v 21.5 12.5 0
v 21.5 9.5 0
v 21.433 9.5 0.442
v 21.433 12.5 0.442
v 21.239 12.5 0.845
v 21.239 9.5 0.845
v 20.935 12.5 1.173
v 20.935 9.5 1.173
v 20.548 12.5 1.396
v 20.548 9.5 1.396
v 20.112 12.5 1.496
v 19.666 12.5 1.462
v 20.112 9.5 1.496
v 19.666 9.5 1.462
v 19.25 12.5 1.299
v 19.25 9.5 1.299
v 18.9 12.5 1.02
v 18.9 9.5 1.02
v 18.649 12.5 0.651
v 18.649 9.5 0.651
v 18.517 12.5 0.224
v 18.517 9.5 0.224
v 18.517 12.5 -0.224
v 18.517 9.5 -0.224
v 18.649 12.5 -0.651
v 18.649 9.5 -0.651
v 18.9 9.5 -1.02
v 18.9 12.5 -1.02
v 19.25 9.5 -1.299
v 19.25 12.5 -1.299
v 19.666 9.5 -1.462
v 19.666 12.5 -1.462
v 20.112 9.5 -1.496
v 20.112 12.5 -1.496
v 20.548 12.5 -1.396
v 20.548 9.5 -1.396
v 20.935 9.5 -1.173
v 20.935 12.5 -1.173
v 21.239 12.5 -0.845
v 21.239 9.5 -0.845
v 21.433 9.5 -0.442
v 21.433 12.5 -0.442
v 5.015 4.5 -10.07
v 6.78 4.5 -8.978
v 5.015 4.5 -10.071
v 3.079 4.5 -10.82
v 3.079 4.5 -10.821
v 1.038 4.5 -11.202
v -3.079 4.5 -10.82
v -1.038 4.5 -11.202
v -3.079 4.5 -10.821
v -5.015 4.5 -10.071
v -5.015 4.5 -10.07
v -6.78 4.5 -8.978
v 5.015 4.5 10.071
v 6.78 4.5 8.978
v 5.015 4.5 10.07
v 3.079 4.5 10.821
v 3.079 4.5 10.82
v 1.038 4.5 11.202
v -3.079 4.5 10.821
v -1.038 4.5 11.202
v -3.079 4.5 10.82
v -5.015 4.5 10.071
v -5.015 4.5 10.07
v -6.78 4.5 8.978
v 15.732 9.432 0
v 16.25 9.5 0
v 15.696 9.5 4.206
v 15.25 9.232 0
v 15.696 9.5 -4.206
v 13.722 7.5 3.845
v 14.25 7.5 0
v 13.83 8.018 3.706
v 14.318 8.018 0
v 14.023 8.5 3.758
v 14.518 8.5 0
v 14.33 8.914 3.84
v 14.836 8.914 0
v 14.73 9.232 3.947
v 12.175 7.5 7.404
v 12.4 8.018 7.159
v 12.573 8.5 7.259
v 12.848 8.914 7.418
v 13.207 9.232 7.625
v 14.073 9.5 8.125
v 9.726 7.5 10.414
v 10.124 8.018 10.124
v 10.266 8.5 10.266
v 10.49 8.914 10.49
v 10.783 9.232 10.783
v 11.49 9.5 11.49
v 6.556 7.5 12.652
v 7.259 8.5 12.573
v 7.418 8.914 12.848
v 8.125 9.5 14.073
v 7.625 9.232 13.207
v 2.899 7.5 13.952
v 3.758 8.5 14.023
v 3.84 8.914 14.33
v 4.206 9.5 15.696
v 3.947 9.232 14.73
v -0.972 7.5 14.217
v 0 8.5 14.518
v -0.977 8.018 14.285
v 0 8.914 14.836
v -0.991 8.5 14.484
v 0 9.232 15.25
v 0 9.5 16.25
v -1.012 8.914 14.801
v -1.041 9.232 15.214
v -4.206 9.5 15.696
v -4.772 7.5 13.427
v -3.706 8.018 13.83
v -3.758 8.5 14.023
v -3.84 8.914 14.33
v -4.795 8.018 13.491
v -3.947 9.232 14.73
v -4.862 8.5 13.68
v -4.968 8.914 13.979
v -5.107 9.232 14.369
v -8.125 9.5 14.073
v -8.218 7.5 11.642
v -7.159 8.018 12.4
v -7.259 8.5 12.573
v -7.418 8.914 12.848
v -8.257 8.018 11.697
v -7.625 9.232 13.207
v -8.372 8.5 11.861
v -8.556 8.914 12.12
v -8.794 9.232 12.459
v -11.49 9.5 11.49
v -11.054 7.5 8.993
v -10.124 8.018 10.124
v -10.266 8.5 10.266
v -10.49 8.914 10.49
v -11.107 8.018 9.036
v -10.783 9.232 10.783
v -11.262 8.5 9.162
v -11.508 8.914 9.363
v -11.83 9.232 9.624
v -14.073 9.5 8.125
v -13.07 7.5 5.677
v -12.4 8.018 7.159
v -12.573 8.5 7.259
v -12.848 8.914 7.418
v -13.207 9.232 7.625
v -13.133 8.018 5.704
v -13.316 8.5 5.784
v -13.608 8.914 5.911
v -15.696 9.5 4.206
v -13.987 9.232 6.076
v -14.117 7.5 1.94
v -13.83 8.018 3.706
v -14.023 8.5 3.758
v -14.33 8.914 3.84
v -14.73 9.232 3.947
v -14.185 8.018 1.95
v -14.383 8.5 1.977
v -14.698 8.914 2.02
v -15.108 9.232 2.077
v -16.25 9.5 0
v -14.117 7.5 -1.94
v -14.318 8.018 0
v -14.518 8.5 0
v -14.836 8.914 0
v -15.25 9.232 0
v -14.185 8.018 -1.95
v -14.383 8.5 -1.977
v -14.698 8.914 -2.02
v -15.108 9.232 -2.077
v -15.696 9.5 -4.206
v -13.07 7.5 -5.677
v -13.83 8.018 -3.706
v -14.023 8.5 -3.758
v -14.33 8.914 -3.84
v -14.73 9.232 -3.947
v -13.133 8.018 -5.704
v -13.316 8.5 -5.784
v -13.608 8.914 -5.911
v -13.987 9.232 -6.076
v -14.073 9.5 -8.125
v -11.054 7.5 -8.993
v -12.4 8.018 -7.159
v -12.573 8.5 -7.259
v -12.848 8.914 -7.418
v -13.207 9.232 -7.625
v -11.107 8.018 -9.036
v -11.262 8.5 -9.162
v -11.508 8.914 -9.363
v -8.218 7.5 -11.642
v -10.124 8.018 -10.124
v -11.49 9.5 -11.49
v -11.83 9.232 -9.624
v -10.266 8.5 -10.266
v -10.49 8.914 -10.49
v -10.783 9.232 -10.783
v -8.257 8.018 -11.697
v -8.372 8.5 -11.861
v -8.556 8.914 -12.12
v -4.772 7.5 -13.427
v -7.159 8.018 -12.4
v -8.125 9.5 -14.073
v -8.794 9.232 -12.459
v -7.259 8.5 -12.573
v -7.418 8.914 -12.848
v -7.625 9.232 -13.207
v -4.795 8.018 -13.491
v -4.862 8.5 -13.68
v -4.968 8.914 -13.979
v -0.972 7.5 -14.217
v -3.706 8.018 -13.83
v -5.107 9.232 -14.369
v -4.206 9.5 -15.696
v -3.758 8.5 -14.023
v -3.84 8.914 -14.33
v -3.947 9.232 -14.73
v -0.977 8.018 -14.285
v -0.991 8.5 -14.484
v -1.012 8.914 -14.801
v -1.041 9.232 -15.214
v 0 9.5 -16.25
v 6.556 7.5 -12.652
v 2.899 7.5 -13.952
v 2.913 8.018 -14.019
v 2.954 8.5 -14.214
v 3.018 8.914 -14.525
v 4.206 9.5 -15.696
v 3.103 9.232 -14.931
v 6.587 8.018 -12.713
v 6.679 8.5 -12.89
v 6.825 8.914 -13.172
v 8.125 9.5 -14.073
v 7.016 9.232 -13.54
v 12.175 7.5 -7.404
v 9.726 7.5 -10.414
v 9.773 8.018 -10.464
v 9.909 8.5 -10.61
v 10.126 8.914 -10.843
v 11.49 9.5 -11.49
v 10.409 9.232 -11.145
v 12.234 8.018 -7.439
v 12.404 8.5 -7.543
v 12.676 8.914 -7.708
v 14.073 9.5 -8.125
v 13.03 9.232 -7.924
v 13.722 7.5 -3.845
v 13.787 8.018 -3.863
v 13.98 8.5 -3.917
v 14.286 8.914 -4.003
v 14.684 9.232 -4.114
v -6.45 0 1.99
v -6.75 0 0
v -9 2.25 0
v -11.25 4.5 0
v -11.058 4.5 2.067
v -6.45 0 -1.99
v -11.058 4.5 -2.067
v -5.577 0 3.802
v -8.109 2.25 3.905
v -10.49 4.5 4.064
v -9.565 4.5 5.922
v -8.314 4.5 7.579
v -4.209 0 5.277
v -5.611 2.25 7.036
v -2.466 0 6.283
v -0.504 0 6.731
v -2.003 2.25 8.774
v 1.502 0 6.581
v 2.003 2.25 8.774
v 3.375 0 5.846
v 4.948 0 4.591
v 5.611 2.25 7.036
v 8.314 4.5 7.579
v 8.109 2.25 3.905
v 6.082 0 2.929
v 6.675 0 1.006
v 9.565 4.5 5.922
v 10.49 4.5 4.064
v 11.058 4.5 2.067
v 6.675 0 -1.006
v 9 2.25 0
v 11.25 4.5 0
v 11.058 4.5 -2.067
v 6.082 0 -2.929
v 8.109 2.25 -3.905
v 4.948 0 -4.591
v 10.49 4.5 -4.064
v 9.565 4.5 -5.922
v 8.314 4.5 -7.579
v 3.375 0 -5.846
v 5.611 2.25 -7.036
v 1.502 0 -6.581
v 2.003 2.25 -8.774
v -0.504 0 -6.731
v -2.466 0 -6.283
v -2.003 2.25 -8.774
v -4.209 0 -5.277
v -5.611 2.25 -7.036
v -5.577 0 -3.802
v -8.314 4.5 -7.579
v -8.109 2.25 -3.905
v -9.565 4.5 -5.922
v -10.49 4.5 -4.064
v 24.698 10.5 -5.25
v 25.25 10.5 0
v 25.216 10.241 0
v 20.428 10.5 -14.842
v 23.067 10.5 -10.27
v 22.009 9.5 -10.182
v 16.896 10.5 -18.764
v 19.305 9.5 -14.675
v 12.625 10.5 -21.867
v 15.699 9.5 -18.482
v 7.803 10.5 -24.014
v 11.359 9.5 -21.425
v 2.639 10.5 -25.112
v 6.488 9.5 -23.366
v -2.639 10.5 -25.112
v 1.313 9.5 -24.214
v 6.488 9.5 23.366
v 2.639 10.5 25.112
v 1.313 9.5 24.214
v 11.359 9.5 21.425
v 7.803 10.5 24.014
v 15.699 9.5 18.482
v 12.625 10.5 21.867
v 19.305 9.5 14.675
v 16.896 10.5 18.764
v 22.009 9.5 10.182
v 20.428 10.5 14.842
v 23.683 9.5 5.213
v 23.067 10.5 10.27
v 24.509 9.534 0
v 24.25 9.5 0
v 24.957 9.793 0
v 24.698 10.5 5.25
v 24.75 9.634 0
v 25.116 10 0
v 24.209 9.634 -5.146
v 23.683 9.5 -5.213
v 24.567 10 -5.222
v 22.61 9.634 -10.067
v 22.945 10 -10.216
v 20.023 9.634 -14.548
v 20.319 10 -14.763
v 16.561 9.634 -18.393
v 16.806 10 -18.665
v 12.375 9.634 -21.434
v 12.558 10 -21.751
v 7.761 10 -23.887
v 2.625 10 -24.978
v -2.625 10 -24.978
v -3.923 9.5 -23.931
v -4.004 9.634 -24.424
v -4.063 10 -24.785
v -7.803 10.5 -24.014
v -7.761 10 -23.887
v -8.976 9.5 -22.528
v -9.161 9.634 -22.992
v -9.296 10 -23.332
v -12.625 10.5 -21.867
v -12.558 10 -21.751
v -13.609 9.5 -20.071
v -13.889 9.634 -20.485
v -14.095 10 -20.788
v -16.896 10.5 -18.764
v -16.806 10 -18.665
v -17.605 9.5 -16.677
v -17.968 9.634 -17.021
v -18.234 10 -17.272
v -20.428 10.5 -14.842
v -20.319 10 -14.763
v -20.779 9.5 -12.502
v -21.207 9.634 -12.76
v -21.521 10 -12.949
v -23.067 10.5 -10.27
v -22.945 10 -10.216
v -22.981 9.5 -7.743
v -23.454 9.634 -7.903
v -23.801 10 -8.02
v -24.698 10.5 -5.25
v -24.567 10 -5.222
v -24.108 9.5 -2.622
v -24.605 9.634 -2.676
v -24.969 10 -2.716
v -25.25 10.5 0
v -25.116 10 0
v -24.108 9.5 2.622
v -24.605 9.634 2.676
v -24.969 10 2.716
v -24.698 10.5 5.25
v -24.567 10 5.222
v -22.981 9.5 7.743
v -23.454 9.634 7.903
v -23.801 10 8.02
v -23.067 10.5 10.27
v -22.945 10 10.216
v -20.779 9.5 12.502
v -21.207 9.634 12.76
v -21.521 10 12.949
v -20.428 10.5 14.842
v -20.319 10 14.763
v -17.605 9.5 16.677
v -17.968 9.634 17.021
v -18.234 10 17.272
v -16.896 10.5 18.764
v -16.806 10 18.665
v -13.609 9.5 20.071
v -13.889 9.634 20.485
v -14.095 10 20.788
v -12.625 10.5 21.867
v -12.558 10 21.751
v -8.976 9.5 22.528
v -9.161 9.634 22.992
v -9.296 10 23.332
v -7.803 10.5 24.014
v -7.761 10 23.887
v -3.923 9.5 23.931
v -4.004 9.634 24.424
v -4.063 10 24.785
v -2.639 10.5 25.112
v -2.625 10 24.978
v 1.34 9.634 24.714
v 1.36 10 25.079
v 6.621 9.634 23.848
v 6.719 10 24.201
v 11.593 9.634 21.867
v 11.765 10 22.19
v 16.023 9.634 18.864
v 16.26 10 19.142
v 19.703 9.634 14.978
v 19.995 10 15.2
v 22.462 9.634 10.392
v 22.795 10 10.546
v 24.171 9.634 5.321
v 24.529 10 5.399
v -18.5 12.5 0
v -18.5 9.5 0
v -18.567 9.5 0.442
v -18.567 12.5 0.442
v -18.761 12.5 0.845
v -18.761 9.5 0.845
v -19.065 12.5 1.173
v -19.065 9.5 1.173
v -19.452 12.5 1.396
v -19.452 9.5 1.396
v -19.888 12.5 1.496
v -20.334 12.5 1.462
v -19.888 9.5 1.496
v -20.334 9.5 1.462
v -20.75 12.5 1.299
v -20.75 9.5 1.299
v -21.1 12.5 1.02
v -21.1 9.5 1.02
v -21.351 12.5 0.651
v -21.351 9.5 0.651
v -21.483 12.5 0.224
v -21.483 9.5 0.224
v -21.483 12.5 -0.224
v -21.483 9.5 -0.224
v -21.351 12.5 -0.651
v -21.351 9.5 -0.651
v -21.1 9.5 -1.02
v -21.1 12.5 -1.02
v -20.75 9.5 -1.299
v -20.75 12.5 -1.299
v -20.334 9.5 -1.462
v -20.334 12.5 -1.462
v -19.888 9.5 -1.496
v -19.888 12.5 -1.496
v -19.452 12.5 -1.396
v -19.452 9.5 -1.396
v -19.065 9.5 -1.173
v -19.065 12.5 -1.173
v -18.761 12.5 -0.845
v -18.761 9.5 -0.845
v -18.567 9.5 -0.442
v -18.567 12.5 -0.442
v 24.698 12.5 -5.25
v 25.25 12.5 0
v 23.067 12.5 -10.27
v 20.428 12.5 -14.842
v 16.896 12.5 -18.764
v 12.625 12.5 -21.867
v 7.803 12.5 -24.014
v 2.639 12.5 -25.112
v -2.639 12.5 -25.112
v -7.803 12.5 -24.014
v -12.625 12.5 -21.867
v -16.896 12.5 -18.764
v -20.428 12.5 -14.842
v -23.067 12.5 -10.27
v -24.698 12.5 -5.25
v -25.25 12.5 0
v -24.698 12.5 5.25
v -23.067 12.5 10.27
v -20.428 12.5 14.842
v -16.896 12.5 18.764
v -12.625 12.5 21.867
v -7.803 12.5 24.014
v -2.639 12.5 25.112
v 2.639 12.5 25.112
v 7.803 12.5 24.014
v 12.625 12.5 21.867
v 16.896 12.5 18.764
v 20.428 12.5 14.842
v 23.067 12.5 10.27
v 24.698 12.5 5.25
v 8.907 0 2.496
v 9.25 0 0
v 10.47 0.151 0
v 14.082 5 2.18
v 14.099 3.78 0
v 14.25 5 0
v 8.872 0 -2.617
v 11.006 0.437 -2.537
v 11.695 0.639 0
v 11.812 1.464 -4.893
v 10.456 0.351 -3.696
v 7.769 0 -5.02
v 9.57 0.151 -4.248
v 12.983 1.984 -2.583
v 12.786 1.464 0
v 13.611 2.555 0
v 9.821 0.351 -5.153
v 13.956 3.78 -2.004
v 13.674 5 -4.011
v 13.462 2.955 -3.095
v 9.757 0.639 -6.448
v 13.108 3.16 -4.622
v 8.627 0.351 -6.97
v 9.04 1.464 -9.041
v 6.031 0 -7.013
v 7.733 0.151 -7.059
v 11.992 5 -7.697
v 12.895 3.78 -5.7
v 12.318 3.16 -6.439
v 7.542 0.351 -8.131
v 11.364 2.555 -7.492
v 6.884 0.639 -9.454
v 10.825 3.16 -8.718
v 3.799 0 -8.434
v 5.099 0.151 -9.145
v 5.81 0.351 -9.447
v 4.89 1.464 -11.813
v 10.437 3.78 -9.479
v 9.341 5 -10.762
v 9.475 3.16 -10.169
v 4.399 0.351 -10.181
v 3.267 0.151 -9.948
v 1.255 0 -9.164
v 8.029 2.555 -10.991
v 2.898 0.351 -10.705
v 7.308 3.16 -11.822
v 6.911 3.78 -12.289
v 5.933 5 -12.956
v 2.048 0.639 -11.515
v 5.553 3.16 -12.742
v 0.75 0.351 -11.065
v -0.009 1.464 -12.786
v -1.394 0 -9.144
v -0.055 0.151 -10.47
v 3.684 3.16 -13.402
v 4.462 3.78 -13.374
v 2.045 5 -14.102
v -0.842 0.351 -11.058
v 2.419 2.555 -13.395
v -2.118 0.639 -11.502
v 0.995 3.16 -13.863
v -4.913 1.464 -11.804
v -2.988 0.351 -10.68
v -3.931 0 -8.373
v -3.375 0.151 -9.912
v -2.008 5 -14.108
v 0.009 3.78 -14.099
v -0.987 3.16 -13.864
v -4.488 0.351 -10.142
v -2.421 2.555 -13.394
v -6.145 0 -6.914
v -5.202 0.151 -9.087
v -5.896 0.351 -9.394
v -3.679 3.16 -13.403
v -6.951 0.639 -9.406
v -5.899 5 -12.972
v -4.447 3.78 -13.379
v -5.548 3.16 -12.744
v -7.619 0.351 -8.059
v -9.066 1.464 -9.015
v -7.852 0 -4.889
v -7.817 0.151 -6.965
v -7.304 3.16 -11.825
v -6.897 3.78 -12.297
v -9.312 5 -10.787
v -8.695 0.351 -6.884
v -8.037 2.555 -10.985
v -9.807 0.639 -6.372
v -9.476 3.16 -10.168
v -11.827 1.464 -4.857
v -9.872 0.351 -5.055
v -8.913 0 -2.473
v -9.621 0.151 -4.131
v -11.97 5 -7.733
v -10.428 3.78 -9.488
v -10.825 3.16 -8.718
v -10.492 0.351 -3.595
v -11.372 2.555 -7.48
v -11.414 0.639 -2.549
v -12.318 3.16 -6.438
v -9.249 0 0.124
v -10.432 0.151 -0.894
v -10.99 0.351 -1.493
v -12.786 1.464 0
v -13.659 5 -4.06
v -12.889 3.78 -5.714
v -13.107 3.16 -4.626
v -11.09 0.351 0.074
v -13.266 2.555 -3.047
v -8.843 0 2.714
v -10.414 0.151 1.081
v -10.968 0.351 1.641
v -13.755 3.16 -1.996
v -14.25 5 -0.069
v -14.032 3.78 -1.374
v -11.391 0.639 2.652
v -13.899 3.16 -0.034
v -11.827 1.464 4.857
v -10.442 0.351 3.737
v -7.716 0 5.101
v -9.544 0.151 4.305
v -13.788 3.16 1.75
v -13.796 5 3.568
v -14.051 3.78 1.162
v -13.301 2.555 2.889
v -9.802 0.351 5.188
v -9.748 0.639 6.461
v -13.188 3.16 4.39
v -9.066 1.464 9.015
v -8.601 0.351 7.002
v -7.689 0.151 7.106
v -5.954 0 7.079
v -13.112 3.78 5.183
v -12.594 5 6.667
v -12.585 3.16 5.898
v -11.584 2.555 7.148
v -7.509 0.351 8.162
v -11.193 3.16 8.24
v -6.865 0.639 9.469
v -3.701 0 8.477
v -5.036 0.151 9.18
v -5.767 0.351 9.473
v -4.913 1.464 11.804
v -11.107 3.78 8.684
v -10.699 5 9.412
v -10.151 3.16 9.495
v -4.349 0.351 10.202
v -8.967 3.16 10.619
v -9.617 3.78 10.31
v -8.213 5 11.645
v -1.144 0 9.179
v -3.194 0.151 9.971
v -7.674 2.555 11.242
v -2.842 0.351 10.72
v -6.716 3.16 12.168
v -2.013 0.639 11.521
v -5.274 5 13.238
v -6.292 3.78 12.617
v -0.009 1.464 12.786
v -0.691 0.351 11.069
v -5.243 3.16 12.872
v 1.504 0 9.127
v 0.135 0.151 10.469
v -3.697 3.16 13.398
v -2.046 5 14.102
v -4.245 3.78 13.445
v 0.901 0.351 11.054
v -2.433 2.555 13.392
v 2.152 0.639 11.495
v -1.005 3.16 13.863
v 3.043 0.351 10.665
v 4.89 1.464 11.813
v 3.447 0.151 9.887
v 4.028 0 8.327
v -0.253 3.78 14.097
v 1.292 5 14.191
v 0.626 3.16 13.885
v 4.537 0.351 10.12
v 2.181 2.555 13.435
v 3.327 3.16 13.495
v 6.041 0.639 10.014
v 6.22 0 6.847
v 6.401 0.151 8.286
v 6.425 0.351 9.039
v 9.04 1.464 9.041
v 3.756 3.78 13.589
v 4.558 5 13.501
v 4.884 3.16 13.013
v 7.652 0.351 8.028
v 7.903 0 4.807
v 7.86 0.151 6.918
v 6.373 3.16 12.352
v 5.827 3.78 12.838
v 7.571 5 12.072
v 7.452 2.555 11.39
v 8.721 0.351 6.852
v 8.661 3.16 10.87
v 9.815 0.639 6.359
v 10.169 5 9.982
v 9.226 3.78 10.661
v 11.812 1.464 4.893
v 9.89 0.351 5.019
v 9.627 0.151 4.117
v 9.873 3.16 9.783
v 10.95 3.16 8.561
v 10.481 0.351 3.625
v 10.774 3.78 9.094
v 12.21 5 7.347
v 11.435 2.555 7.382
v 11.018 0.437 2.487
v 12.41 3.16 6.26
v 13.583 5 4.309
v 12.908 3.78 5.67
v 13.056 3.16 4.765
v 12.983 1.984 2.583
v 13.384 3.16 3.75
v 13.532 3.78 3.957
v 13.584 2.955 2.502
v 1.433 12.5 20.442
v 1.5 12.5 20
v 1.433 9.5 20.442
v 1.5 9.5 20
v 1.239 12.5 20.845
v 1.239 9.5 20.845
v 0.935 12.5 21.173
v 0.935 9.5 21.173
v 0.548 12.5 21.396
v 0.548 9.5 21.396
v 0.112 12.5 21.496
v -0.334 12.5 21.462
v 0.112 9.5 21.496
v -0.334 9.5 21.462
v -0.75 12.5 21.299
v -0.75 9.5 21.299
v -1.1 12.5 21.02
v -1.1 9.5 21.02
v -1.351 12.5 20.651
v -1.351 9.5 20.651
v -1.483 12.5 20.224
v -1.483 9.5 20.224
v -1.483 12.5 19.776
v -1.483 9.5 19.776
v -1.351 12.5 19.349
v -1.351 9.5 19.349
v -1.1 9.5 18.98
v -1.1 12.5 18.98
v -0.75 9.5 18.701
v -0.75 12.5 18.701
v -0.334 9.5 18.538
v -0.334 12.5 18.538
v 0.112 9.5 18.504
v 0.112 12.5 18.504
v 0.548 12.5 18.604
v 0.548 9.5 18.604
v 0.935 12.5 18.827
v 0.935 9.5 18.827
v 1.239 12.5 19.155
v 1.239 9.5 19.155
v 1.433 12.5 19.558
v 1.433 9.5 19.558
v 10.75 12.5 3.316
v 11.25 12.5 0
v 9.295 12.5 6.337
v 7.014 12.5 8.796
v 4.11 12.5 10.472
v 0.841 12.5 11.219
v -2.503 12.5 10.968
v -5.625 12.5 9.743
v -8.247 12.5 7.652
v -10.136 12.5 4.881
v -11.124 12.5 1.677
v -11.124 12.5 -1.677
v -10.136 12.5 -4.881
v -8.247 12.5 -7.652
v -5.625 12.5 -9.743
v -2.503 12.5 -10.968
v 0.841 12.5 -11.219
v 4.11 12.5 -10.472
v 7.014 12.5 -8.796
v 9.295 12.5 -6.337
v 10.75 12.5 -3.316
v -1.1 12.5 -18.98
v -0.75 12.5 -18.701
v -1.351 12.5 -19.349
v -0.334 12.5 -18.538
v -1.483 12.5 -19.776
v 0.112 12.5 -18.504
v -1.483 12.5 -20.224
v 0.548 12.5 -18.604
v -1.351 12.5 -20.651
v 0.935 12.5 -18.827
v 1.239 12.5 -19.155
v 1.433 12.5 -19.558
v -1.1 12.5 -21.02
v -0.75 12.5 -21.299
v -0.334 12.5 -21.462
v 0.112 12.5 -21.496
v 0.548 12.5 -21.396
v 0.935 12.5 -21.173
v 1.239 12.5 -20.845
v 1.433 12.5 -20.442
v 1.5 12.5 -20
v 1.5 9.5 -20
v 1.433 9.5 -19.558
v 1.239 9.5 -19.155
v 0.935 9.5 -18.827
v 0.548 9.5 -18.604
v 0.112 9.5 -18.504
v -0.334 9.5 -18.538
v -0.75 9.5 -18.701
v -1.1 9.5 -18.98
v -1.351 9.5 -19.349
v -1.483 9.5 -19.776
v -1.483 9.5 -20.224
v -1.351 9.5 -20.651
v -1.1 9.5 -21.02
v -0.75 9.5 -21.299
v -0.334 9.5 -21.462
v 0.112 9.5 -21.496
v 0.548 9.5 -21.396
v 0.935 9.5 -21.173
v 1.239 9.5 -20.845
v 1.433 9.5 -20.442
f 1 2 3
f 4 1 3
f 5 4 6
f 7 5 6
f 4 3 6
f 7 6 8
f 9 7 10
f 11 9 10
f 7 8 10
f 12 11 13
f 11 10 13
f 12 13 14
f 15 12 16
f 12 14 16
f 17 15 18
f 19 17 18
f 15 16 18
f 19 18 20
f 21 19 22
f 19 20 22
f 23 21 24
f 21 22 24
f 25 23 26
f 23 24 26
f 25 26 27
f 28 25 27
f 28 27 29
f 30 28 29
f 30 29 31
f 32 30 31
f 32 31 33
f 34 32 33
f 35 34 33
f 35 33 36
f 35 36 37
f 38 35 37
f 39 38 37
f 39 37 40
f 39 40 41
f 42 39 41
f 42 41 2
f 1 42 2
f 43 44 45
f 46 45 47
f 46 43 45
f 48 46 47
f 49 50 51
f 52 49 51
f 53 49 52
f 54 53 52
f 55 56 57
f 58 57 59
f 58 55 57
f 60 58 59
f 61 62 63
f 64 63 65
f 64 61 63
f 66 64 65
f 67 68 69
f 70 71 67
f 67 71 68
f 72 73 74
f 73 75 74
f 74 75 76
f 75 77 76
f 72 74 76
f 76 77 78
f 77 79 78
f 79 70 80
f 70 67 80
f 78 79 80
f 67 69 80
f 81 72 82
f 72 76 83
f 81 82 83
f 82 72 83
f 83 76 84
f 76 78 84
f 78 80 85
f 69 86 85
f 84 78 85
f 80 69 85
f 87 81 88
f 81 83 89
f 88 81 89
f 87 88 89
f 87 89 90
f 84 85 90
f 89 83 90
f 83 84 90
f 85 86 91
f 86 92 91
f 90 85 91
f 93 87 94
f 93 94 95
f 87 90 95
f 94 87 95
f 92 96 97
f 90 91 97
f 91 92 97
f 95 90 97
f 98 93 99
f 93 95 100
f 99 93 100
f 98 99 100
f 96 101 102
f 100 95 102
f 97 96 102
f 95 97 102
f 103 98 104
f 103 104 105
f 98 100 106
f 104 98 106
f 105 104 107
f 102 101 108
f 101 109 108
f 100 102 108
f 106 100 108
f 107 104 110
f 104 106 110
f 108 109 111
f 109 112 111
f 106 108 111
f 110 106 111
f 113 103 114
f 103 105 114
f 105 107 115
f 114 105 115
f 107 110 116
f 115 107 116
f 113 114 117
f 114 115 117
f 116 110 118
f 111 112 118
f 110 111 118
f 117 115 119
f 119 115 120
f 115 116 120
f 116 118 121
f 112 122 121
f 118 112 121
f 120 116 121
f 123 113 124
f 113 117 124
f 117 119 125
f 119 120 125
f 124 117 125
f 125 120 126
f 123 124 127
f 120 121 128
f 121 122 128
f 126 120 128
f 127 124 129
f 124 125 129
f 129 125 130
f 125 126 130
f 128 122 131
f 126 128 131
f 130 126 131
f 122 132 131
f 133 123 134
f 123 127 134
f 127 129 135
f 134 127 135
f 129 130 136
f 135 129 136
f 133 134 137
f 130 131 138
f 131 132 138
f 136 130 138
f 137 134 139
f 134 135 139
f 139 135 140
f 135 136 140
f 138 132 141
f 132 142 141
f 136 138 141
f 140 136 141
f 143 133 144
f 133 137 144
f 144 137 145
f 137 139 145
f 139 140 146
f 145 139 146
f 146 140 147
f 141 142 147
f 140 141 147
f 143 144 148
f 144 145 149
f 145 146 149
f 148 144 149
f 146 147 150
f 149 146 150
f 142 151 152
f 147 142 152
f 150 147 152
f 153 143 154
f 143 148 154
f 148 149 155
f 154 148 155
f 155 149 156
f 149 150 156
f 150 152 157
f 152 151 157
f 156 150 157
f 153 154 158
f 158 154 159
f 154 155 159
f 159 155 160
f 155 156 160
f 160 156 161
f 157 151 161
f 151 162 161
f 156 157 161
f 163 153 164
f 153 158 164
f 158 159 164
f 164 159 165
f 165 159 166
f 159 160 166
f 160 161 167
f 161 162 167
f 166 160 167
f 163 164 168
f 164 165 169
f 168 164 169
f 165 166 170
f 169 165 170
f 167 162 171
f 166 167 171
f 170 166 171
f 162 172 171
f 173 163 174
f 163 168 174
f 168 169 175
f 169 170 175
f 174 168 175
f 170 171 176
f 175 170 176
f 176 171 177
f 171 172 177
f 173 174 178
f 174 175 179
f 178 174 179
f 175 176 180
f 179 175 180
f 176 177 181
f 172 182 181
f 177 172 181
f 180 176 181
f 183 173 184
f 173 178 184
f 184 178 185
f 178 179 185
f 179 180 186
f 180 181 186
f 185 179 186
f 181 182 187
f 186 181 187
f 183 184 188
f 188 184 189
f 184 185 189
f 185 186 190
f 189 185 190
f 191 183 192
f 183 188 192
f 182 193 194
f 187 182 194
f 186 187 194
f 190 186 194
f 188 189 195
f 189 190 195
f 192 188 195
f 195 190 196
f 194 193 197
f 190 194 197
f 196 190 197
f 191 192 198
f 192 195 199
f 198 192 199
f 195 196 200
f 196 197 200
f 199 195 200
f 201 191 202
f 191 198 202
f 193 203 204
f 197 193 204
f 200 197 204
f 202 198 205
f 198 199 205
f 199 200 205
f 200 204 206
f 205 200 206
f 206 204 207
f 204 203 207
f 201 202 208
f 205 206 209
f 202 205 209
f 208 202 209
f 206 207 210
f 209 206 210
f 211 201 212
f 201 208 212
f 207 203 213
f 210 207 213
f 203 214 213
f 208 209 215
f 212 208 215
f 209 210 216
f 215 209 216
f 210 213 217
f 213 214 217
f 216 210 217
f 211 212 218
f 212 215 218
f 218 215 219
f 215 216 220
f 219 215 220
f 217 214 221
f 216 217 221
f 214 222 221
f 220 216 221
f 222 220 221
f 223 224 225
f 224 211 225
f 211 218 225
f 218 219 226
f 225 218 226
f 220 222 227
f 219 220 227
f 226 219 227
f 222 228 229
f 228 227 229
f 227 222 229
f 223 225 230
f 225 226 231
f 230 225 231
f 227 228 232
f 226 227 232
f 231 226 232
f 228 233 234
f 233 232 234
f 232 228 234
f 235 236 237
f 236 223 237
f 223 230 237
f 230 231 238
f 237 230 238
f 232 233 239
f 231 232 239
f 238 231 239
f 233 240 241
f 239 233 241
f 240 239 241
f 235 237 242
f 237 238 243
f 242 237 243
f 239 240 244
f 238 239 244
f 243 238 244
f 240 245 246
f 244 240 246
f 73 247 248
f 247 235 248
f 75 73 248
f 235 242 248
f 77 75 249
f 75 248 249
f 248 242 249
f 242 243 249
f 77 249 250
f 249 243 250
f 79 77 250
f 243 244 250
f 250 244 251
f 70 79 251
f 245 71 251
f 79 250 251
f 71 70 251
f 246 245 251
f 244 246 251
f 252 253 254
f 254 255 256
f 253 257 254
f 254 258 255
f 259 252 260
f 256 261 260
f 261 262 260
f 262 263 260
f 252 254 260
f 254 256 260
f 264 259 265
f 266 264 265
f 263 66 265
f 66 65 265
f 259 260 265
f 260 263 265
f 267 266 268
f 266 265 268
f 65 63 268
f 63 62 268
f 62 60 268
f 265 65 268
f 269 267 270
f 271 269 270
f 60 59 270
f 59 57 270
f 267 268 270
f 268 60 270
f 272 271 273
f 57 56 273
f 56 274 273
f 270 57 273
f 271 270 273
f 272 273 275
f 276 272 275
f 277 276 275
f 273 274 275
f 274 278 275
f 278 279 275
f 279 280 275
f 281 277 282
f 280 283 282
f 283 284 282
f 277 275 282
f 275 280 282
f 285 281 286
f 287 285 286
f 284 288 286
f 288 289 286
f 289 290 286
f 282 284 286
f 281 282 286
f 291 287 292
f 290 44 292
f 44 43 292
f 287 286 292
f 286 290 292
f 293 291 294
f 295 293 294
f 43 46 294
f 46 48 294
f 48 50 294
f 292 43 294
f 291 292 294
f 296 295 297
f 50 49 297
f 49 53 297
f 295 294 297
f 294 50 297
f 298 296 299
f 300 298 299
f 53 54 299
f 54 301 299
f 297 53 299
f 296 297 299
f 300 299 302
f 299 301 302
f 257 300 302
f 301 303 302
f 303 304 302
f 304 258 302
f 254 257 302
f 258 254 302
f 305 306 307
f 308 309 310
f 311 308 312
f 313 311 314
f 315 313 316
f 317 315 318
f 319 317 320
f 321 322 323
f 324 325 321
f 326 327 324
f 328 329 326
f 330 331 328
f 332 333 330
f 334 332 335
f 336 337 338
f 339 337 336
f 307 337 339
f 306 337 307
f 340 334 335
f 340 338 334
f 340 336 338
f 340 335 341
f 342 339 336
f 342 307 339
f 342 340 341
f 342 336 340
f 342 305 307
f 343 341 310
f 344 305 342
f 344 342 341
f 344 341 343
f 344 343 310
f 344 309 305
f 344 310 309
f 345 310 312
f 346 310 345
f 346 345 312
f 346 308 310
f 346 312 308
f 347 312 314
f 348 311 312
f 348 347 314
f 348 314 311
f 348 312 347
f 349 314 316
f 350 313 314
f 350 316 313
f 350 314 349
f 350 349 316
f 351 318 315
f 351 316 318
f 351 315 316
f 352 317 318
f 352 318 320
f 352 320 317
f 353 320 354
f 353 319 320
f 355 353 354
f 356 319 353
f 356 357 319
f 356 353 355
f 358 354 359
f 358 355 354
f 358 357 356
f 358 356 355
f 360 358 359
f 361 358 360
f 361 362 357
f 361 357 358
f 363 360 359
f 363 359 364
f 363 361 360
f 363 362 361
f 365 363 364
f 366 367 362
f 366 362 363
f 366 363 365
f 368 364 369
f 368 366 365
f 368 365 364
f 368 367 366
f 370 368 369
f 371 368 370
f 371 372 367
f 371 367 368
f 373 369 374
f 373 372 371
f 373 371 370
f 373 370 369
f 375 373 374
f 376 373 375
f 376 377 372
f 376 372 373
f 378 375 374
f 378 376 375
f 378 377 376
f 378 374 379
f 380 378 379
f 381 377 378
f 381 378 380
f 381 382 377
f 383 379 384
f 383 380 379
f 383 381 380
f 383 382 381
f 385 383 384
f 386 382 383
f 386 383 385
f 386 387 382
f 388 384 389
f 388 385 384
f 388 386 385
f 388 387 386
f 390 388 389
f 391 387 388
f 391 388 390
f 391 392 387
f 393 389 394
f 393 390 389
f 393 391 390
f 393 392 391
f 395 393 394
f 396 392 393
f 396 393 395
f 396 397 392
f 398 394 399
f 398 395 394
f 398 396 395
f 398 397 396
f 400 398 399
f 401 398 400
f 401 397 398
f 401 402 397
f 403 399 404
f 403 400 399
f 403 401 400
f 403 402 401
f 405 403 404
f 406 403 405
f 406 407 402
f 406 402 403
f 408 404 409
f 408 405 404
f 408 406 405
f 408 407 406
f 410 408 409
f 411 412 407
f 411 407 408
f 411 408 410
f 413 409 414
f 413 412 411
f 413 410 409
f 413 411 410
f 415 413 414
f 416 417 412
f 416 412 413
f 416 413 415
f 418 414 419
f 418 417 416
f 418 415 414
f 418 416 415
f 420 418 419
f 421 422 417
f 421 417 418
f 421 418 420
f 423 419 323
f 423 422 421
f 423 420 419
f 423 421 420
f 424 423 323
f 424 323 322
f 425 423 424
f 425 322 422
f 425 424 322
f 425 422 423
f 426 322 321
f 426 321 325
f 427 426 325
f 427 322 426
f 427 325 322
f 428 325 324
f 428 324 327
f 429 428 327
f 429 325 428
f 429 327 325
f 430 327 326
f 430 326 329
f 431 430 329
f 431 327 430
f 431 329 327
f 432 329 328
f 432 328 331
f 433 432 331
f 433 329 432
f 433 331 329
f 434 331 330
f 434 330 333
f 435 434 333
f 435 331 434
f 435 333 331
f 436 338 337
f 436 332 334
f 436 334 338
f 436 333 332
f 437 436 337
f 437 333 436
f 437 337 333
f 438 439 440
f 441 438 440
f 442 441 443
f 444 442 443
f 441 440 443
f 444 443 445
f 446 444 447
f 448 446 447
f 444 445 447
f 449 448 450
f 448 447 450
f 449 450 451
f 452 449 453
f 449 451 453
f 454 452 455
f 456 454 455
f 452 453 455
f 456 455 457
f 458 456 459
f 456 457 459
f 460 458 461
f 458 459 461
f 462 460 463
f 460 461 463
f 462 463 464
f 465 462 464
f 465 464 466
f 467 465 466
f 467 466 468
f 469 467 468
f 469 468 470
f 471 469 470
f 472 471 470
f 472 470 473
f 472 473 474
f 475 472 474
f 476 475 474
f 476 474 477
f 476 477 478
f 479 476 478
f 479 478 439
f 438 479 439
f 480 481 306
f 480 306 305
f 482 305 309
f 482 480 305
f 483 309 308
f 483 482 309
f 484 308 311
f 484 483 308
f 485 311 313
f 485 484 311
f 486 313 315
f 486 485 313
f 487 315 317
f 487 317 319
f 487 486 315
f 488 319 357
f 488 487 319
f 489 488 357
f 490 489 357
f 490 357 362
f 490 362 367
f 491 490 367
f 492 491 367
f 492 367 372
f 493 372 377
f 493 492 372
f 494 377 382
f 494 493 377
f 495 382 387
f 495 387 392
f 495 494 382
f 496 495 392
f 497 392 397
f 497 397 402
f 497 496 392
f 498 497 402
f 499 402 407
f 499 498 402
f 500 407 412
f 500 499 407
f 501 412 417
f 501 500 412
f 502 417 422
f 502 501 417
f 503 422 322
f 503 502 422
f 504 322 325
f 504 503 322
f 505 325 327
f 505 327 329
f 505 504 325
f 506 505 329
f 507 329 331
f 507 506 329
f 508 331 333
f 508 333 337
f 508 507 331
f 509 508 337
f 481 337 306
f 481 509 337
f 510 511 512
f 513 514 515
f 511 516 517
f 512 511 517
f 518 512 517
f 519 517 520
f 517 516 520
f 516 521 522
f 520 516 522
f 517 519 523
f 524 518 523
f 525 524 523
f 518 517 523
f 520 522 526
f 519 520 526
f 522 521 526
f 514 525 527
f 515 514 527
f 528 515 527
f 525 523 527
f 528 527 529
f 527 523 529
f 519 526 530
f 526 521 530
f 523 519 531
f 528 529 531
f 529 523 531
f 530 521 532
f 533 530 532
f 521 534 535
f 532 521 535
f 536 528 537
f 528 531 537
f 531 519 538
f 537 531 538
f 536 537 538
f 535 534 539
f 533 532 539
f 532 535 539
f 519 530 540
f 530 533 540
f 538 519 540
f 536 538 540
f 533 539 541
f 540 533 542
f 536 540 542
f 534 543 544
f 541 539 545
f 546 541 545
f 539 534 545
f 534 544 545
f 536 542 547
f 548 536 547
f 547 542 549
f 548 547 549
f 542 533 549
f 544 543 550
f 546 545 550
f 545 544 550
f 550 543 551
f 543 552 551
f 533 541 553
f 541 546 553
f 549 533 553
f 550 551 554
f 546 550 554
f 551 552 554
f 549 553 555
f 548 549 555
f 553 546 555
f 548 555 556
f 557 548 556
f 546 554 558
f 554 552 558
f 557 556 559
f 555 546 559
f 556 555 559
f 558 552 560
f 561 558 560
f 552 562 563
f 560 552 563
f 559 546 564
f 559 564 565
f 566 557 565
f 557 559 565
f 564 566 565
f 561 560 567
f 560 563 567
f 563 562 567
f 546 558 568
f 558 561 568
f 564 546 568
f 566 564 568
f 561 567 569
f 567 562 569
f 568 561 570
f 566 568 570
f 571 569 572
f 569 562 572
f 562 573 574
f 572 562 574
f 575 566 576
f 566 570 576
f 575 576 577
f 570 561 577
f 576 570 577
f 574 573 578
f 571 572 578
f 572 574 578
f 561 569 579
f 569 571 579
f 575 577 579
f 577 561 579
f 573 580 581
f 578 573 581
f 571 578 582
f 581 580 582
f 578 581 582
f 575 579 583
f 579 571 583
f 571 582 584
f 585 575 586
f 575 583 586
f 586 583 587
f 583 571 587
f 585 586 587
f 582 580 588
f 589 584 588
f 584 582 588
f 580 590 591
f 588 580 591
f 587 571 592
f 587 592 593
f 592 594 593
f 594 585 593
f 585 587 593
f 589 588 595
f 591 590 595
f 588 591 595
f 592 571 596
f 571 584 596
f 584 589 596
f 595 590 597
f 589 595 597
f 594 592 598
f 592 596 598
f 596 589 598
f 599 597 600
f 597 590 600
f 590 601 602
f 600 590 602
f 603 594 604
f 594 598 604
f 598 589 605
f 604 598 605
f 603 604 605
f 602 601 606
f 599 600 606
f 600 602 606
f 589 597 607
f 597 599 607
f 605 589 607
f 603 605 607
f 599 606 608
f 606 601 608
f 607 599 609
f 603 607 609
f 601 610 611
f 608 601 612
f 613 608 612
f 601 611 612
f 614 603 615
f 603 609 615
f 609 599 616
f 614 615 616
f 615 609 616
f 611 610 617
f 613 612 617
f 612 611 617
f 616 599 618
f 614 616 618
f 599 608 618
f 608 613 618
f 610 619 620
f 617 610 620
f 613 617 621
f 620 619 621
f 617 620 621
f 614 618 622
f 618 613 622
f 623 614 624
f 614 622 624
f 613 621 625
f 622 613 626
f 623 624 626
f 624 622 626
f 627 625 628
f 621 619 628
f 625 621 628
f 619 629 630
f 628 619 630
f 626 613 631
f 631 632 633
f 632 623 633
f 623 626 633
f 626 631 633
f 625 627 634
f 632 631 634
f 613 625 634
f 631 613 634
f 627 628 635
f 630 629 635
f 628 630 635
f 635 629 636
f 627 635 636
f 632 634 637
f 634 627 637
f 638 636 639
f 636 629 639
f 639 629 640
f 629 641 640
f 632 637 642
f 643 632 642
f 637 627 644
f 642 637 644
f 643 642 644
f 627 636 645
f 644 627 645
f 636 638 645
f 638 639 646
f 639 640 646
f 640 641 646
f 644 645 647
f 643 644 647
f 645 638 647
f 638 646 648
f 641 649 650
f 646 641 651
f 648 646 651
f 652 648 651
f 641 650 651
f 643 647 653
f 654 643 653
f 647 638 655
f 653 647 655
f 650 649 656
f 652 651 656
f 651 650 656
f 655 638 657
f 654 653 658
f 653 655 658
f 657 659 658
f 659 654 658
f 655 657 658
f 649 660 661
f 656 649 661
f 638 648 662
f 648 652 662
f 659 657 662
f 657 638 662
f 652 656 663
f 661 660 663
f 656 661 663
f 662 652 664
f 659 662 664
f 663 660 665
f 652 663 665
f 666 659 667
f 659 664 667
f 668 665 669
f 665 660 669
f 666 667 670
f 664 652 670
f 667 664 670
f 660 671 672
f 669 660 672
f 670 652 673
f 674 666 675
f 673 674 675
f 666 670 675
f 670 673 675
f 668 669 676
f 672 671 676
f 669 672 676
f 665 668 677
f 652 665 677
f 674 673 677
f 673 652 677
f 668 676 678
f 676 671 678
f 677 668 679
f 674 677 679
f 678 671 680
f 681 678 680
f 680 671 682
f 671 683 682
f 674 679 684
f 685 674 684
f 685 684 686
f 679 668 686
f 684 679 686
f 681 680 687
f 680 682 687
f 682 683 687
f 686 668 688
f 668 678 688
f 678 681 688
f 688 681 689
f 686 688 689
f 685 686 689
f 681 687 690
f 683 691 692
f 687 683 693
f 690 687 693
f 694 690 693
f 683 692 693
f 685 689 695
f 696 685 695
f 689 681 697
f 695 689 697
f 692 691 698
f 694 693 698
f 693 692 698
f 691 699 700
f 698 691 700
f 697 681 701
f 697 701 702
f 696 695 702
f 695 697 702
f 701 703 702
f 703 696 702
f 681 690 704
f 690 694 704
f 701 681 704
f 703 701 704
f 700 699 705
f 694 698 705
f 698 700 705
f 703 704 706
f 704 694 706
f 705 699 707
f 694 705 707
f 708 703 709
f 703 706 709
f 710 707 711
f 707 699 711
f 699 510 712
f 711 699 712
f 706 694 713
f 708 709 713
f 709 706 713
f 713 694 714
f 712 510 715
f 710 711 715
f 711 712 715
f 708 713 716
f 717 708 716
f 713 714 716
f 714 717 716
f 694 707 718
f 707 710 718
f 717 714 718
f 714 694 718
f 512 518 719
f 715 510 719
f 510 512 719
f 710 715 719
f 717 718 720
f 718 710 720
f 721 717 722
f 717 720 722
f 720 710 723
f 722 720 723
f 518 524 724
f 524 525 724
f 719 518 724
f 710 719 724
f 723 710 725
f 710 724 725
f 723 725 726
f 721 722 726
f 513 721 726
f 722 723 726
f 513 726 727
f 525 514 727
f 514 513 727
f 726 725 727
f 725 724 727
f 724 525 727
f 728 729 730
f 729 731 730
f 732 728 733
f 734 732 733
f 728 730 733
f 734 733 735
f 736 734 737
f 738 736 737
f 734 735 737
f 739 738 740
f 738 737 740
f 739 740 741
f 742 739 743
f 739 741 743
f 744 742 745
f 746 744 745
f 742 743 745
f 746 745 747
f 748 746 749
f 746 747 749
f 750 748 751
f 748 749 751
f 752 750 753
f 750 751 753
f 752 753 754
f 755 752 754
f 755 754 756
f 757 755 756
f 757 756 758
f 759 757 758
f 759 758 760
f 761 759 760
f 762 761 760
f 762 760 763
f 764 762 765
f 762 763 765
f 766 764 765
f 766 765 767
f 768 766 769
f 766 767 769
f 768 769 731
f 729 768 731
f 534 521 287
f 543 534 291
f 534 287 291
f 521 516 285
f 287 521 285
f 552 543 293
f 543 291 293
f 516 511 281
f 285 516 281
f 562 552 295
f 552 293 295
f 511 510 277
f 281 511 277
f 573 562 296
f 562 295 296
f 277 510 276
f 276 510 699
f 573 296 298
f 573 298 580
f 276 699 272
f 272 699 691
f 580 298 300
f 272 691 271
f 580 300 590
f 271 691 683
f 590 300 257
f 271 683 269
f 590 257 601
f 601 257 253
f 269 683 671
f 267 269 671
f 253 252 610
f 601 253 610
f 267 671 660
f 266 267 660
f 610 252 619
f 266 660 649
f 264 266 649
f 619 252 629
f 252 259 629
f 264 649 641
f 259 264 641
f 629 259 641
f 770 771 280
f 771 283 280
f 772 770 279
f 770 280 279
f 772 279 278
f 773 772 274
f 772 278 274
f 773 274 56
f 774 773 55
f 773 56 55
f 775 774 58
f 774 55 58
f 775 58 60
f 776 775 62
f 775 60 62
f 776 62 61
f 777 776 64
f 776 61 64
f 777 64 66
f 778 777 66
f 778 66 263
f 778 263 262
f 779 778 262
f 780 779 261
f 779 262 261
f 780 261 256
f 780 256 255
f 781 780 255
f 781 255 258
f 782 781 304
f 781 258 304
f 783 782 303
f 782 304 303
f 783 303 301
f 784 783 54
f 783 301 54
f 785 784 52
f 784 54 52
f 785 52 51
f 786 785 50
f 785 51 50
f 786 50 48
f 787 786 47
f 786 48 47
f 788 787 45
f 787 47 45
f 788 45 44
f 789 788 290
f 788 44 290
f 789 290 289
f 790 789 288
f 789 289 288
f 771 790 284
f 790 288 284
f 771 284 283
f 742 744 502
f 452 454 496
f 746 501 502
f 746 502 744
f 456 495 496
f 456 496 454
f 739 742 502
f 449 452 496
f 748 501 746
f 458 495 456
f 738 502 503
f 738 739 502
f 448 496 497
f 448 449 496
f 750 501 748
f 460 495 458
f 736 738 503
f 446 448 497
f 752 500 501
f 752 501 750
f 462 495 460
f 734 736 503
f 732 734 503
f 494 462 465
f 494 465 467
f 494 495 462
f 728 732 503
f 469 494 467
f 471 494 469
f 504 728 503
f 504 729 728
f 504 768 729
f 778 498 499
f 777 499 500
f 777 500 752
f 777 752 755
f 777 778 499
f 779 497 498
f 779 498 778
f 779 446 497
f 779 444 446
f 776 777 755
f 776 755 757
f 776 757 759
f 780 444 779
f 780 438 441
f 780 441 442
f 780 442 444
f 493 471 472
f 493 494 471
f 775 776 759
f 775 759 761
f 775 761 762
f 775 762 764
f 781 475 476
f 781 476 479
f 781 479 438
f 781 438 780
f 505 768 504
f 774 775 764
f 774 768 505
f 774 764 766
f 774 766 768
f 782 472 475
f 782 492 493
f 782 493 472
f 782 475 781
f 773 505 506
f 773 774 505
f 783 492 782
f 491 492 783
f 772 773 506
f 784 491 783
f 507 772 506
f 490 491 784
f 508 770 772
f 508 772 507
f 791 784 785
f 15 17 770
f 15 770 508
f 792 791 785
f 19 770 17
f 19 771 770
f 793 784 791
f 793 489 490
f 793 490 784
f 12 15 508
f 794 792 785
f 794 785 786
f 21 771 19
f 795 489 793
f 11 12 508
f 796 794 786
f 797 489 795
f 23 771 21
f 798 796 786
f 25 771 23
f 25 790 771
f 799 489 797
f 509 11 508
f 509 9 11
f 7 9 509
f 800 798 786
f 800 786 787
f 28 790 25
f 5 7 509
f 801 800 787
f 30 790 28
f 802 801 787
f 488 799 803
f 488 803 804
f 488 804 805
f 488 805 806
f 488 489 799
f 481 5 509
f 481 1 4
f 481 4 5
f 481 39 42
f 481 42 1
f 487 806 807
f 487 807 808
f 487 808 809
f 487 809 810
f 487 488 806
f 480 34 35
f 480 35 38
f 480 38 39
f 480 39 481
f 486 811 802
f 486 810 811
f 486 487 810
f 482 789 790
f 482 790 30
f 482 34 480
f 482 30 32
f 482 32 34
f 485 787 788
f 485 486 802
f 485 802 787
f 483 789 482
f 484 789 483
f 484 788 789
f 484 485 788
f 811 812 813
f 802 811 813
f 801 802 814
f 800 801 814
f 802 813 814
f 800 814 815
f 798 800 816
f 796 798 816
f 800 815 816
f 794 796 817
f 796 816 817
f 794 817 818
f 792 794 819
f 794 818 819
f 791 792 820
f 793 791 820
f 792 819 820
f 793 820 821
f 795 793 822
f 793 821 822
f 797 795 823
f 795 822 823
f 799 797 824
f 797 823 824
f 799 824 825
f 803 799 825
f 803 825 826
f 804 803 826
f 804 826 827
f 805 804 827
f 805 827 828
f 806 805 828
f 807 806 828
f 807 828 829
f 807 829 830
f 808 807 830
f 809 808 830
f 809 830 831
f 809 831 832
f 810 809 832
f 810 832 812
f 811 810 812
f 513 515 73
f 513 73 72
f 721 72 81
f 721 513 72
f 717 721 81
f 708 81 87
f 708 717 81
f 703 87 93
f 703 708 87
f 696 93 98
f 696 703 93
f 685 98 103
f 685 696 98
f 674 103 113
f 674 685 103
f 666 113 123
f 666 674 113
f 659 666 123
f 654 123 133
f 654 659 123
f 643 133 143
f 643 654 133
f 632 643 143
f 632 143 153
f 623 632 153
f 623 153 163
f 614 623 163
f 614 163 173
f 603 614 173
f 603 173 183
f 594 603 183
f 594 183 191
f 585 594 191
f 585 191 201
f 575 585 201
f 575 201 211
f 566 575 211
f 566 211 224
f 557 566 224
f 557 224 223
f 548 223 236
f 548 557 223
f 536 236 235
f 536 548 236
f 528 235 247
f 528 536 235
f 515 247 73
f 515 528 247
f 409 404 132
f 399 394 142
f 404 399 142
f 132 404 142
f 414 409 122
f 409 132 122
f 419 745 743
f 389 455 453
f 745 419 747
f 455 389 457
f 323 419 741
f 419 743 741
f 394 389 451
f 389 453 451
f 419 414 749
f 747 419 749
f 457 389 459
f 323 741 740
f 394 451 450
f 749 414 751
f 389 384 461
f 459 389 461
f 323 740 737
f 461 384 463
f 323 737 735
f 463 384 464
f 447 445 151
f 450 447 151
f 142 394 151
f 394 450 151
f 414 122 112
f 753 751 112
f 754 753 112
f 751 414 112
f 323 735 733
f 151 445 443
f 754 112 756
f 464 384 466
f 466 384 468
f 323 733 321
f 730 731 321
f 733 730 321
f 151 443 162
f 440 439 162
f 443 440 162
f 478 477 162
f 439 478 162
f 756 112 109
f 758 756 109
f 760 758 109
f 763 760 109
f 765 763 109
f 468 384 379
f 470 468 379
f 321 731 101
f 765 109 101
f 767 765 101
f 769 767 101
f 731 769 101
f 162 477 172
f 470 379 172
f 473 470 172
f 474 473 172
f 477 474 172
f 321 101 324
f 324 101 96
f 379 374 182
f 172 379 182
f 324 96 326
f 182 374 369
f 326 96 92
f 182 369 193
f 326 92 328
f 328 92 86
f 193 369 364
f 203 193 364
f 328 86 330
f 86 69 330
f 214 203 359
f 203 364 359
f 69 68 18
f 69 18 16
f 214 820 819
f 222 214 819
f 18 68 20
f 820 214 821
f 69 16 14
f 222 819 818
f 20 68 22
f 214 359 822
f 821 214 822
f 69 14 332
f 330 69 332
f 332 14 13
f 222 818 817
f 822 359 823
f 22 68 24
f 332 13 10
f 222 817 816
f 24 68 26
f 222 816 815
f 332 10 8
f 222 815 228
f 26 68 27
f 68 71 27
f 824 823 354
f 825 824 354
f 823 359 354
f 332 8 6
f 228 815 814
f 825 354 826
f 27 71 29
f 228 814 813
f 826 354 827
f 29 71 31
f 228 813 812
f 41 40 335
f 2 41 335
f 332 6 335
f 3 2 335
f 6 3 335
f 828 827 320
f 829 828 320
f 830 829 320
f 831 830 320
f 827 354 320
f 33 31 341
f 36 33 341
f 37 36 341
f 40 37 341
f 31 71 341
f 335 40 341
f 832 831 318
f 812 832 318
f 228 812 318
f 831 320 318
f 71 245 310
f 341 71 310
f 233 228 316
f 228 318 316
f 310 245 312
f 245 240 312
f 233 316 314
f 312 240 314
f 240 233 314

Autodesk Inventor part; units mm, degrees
ref_plane "YZ Plane" through (0, 0, 0) normal (1, 0, 0) x (0, 1, 0)
ref_plane "XZ Plane" through (0, 0, 0) normal (0, 1, 0) x (-1, 0, 0)
ref_plane "XY Plane" through (0, 0, 0) normal (0, 0, 1) x (1, 0, 0)
sketch "Sketch1" plane through (0, 0, 0) normal (0, 1, 0) x (-1, 0, 0)
  circle A0 centre (0, 0) radius 11.25
  circle A1 centre (0, 0) radius 14.25
  circle A2 centre (0, 0) radius 30
  circle A3 centre (0, 0) radius 6.75
  dimension "d0" = 22.5
  dimension "d1" = 28.5
  dimension "d2" = 60
  dimension "d3" = 13.5
extrude "Extrusion1" add sketch "Sketch1" along normal blind 4.5 contours A0 | A1
sketch "Sketch2" plane through (0, 4.5, 0) normal (0, 1, 0) x (1, 0, 0)
  circle A0 centre (0, 0) radius 14.25 projected
  circle A1 centre (0, 0) radius 11.25
  dimension "d6" = 22.5
extrude "Extrusion2" add sketch "Sketch2" along normal blind 8
sketch "Sketch3" plane through (0, 12.5, 0) normal (0, 1, 0) x (1, 0, 0)
  circle A0 centre (0, 0) radius 14.25 projected
  circle A1 centre (0, 0) radius 25.25
  dimension "d9" = 50.5
extrude "Extrusion3" add sketch "Sketch3" against normal blind 3
chamfer "Chamfer2" distance 4.5 angle 45 1 edges at (6.75, 4.5, 0)
fillet "Fillet1" radius 5 1 edges at (14.25, 0, 0)
fillet "Fillet2" radius 2 1 edges at (-14.25, 9.5, 0)
fillet "Fillet3" radius 1 1 edges at (-25.25, 9.5, 0)
sketch "Sketch5" plane through (0, 9.5, 0) normal (0, -1, 0) x (1, 0, 0)
  circle A0 centre (0, 0) radius 16.25 projected
  circle A1 centre (-20, 0) radius 1.5
  circle A2 centre (-20, 0) radius 3.75
  circle A3 centre (20, 0) radius 1.5
  circle A4 centre (0, -20) radius 1.5
  circle A5 centre (0, 20) radius 1.5
  dimension "d21" = 3
  dimension "d22" = 20
  dimension "d23" = 3
  dimension "d24" = 20
  dimension "d25" = 3
  dimension "d26" = 20
  dimension "d27" = 3
  dimension "d28" = 20
extrude "Extrusion4" cut sketch "Sketch5" against normal blind 11 contours A1 | A3 | A4 | A5
properties part number "supportoCuscinettoBasso"
